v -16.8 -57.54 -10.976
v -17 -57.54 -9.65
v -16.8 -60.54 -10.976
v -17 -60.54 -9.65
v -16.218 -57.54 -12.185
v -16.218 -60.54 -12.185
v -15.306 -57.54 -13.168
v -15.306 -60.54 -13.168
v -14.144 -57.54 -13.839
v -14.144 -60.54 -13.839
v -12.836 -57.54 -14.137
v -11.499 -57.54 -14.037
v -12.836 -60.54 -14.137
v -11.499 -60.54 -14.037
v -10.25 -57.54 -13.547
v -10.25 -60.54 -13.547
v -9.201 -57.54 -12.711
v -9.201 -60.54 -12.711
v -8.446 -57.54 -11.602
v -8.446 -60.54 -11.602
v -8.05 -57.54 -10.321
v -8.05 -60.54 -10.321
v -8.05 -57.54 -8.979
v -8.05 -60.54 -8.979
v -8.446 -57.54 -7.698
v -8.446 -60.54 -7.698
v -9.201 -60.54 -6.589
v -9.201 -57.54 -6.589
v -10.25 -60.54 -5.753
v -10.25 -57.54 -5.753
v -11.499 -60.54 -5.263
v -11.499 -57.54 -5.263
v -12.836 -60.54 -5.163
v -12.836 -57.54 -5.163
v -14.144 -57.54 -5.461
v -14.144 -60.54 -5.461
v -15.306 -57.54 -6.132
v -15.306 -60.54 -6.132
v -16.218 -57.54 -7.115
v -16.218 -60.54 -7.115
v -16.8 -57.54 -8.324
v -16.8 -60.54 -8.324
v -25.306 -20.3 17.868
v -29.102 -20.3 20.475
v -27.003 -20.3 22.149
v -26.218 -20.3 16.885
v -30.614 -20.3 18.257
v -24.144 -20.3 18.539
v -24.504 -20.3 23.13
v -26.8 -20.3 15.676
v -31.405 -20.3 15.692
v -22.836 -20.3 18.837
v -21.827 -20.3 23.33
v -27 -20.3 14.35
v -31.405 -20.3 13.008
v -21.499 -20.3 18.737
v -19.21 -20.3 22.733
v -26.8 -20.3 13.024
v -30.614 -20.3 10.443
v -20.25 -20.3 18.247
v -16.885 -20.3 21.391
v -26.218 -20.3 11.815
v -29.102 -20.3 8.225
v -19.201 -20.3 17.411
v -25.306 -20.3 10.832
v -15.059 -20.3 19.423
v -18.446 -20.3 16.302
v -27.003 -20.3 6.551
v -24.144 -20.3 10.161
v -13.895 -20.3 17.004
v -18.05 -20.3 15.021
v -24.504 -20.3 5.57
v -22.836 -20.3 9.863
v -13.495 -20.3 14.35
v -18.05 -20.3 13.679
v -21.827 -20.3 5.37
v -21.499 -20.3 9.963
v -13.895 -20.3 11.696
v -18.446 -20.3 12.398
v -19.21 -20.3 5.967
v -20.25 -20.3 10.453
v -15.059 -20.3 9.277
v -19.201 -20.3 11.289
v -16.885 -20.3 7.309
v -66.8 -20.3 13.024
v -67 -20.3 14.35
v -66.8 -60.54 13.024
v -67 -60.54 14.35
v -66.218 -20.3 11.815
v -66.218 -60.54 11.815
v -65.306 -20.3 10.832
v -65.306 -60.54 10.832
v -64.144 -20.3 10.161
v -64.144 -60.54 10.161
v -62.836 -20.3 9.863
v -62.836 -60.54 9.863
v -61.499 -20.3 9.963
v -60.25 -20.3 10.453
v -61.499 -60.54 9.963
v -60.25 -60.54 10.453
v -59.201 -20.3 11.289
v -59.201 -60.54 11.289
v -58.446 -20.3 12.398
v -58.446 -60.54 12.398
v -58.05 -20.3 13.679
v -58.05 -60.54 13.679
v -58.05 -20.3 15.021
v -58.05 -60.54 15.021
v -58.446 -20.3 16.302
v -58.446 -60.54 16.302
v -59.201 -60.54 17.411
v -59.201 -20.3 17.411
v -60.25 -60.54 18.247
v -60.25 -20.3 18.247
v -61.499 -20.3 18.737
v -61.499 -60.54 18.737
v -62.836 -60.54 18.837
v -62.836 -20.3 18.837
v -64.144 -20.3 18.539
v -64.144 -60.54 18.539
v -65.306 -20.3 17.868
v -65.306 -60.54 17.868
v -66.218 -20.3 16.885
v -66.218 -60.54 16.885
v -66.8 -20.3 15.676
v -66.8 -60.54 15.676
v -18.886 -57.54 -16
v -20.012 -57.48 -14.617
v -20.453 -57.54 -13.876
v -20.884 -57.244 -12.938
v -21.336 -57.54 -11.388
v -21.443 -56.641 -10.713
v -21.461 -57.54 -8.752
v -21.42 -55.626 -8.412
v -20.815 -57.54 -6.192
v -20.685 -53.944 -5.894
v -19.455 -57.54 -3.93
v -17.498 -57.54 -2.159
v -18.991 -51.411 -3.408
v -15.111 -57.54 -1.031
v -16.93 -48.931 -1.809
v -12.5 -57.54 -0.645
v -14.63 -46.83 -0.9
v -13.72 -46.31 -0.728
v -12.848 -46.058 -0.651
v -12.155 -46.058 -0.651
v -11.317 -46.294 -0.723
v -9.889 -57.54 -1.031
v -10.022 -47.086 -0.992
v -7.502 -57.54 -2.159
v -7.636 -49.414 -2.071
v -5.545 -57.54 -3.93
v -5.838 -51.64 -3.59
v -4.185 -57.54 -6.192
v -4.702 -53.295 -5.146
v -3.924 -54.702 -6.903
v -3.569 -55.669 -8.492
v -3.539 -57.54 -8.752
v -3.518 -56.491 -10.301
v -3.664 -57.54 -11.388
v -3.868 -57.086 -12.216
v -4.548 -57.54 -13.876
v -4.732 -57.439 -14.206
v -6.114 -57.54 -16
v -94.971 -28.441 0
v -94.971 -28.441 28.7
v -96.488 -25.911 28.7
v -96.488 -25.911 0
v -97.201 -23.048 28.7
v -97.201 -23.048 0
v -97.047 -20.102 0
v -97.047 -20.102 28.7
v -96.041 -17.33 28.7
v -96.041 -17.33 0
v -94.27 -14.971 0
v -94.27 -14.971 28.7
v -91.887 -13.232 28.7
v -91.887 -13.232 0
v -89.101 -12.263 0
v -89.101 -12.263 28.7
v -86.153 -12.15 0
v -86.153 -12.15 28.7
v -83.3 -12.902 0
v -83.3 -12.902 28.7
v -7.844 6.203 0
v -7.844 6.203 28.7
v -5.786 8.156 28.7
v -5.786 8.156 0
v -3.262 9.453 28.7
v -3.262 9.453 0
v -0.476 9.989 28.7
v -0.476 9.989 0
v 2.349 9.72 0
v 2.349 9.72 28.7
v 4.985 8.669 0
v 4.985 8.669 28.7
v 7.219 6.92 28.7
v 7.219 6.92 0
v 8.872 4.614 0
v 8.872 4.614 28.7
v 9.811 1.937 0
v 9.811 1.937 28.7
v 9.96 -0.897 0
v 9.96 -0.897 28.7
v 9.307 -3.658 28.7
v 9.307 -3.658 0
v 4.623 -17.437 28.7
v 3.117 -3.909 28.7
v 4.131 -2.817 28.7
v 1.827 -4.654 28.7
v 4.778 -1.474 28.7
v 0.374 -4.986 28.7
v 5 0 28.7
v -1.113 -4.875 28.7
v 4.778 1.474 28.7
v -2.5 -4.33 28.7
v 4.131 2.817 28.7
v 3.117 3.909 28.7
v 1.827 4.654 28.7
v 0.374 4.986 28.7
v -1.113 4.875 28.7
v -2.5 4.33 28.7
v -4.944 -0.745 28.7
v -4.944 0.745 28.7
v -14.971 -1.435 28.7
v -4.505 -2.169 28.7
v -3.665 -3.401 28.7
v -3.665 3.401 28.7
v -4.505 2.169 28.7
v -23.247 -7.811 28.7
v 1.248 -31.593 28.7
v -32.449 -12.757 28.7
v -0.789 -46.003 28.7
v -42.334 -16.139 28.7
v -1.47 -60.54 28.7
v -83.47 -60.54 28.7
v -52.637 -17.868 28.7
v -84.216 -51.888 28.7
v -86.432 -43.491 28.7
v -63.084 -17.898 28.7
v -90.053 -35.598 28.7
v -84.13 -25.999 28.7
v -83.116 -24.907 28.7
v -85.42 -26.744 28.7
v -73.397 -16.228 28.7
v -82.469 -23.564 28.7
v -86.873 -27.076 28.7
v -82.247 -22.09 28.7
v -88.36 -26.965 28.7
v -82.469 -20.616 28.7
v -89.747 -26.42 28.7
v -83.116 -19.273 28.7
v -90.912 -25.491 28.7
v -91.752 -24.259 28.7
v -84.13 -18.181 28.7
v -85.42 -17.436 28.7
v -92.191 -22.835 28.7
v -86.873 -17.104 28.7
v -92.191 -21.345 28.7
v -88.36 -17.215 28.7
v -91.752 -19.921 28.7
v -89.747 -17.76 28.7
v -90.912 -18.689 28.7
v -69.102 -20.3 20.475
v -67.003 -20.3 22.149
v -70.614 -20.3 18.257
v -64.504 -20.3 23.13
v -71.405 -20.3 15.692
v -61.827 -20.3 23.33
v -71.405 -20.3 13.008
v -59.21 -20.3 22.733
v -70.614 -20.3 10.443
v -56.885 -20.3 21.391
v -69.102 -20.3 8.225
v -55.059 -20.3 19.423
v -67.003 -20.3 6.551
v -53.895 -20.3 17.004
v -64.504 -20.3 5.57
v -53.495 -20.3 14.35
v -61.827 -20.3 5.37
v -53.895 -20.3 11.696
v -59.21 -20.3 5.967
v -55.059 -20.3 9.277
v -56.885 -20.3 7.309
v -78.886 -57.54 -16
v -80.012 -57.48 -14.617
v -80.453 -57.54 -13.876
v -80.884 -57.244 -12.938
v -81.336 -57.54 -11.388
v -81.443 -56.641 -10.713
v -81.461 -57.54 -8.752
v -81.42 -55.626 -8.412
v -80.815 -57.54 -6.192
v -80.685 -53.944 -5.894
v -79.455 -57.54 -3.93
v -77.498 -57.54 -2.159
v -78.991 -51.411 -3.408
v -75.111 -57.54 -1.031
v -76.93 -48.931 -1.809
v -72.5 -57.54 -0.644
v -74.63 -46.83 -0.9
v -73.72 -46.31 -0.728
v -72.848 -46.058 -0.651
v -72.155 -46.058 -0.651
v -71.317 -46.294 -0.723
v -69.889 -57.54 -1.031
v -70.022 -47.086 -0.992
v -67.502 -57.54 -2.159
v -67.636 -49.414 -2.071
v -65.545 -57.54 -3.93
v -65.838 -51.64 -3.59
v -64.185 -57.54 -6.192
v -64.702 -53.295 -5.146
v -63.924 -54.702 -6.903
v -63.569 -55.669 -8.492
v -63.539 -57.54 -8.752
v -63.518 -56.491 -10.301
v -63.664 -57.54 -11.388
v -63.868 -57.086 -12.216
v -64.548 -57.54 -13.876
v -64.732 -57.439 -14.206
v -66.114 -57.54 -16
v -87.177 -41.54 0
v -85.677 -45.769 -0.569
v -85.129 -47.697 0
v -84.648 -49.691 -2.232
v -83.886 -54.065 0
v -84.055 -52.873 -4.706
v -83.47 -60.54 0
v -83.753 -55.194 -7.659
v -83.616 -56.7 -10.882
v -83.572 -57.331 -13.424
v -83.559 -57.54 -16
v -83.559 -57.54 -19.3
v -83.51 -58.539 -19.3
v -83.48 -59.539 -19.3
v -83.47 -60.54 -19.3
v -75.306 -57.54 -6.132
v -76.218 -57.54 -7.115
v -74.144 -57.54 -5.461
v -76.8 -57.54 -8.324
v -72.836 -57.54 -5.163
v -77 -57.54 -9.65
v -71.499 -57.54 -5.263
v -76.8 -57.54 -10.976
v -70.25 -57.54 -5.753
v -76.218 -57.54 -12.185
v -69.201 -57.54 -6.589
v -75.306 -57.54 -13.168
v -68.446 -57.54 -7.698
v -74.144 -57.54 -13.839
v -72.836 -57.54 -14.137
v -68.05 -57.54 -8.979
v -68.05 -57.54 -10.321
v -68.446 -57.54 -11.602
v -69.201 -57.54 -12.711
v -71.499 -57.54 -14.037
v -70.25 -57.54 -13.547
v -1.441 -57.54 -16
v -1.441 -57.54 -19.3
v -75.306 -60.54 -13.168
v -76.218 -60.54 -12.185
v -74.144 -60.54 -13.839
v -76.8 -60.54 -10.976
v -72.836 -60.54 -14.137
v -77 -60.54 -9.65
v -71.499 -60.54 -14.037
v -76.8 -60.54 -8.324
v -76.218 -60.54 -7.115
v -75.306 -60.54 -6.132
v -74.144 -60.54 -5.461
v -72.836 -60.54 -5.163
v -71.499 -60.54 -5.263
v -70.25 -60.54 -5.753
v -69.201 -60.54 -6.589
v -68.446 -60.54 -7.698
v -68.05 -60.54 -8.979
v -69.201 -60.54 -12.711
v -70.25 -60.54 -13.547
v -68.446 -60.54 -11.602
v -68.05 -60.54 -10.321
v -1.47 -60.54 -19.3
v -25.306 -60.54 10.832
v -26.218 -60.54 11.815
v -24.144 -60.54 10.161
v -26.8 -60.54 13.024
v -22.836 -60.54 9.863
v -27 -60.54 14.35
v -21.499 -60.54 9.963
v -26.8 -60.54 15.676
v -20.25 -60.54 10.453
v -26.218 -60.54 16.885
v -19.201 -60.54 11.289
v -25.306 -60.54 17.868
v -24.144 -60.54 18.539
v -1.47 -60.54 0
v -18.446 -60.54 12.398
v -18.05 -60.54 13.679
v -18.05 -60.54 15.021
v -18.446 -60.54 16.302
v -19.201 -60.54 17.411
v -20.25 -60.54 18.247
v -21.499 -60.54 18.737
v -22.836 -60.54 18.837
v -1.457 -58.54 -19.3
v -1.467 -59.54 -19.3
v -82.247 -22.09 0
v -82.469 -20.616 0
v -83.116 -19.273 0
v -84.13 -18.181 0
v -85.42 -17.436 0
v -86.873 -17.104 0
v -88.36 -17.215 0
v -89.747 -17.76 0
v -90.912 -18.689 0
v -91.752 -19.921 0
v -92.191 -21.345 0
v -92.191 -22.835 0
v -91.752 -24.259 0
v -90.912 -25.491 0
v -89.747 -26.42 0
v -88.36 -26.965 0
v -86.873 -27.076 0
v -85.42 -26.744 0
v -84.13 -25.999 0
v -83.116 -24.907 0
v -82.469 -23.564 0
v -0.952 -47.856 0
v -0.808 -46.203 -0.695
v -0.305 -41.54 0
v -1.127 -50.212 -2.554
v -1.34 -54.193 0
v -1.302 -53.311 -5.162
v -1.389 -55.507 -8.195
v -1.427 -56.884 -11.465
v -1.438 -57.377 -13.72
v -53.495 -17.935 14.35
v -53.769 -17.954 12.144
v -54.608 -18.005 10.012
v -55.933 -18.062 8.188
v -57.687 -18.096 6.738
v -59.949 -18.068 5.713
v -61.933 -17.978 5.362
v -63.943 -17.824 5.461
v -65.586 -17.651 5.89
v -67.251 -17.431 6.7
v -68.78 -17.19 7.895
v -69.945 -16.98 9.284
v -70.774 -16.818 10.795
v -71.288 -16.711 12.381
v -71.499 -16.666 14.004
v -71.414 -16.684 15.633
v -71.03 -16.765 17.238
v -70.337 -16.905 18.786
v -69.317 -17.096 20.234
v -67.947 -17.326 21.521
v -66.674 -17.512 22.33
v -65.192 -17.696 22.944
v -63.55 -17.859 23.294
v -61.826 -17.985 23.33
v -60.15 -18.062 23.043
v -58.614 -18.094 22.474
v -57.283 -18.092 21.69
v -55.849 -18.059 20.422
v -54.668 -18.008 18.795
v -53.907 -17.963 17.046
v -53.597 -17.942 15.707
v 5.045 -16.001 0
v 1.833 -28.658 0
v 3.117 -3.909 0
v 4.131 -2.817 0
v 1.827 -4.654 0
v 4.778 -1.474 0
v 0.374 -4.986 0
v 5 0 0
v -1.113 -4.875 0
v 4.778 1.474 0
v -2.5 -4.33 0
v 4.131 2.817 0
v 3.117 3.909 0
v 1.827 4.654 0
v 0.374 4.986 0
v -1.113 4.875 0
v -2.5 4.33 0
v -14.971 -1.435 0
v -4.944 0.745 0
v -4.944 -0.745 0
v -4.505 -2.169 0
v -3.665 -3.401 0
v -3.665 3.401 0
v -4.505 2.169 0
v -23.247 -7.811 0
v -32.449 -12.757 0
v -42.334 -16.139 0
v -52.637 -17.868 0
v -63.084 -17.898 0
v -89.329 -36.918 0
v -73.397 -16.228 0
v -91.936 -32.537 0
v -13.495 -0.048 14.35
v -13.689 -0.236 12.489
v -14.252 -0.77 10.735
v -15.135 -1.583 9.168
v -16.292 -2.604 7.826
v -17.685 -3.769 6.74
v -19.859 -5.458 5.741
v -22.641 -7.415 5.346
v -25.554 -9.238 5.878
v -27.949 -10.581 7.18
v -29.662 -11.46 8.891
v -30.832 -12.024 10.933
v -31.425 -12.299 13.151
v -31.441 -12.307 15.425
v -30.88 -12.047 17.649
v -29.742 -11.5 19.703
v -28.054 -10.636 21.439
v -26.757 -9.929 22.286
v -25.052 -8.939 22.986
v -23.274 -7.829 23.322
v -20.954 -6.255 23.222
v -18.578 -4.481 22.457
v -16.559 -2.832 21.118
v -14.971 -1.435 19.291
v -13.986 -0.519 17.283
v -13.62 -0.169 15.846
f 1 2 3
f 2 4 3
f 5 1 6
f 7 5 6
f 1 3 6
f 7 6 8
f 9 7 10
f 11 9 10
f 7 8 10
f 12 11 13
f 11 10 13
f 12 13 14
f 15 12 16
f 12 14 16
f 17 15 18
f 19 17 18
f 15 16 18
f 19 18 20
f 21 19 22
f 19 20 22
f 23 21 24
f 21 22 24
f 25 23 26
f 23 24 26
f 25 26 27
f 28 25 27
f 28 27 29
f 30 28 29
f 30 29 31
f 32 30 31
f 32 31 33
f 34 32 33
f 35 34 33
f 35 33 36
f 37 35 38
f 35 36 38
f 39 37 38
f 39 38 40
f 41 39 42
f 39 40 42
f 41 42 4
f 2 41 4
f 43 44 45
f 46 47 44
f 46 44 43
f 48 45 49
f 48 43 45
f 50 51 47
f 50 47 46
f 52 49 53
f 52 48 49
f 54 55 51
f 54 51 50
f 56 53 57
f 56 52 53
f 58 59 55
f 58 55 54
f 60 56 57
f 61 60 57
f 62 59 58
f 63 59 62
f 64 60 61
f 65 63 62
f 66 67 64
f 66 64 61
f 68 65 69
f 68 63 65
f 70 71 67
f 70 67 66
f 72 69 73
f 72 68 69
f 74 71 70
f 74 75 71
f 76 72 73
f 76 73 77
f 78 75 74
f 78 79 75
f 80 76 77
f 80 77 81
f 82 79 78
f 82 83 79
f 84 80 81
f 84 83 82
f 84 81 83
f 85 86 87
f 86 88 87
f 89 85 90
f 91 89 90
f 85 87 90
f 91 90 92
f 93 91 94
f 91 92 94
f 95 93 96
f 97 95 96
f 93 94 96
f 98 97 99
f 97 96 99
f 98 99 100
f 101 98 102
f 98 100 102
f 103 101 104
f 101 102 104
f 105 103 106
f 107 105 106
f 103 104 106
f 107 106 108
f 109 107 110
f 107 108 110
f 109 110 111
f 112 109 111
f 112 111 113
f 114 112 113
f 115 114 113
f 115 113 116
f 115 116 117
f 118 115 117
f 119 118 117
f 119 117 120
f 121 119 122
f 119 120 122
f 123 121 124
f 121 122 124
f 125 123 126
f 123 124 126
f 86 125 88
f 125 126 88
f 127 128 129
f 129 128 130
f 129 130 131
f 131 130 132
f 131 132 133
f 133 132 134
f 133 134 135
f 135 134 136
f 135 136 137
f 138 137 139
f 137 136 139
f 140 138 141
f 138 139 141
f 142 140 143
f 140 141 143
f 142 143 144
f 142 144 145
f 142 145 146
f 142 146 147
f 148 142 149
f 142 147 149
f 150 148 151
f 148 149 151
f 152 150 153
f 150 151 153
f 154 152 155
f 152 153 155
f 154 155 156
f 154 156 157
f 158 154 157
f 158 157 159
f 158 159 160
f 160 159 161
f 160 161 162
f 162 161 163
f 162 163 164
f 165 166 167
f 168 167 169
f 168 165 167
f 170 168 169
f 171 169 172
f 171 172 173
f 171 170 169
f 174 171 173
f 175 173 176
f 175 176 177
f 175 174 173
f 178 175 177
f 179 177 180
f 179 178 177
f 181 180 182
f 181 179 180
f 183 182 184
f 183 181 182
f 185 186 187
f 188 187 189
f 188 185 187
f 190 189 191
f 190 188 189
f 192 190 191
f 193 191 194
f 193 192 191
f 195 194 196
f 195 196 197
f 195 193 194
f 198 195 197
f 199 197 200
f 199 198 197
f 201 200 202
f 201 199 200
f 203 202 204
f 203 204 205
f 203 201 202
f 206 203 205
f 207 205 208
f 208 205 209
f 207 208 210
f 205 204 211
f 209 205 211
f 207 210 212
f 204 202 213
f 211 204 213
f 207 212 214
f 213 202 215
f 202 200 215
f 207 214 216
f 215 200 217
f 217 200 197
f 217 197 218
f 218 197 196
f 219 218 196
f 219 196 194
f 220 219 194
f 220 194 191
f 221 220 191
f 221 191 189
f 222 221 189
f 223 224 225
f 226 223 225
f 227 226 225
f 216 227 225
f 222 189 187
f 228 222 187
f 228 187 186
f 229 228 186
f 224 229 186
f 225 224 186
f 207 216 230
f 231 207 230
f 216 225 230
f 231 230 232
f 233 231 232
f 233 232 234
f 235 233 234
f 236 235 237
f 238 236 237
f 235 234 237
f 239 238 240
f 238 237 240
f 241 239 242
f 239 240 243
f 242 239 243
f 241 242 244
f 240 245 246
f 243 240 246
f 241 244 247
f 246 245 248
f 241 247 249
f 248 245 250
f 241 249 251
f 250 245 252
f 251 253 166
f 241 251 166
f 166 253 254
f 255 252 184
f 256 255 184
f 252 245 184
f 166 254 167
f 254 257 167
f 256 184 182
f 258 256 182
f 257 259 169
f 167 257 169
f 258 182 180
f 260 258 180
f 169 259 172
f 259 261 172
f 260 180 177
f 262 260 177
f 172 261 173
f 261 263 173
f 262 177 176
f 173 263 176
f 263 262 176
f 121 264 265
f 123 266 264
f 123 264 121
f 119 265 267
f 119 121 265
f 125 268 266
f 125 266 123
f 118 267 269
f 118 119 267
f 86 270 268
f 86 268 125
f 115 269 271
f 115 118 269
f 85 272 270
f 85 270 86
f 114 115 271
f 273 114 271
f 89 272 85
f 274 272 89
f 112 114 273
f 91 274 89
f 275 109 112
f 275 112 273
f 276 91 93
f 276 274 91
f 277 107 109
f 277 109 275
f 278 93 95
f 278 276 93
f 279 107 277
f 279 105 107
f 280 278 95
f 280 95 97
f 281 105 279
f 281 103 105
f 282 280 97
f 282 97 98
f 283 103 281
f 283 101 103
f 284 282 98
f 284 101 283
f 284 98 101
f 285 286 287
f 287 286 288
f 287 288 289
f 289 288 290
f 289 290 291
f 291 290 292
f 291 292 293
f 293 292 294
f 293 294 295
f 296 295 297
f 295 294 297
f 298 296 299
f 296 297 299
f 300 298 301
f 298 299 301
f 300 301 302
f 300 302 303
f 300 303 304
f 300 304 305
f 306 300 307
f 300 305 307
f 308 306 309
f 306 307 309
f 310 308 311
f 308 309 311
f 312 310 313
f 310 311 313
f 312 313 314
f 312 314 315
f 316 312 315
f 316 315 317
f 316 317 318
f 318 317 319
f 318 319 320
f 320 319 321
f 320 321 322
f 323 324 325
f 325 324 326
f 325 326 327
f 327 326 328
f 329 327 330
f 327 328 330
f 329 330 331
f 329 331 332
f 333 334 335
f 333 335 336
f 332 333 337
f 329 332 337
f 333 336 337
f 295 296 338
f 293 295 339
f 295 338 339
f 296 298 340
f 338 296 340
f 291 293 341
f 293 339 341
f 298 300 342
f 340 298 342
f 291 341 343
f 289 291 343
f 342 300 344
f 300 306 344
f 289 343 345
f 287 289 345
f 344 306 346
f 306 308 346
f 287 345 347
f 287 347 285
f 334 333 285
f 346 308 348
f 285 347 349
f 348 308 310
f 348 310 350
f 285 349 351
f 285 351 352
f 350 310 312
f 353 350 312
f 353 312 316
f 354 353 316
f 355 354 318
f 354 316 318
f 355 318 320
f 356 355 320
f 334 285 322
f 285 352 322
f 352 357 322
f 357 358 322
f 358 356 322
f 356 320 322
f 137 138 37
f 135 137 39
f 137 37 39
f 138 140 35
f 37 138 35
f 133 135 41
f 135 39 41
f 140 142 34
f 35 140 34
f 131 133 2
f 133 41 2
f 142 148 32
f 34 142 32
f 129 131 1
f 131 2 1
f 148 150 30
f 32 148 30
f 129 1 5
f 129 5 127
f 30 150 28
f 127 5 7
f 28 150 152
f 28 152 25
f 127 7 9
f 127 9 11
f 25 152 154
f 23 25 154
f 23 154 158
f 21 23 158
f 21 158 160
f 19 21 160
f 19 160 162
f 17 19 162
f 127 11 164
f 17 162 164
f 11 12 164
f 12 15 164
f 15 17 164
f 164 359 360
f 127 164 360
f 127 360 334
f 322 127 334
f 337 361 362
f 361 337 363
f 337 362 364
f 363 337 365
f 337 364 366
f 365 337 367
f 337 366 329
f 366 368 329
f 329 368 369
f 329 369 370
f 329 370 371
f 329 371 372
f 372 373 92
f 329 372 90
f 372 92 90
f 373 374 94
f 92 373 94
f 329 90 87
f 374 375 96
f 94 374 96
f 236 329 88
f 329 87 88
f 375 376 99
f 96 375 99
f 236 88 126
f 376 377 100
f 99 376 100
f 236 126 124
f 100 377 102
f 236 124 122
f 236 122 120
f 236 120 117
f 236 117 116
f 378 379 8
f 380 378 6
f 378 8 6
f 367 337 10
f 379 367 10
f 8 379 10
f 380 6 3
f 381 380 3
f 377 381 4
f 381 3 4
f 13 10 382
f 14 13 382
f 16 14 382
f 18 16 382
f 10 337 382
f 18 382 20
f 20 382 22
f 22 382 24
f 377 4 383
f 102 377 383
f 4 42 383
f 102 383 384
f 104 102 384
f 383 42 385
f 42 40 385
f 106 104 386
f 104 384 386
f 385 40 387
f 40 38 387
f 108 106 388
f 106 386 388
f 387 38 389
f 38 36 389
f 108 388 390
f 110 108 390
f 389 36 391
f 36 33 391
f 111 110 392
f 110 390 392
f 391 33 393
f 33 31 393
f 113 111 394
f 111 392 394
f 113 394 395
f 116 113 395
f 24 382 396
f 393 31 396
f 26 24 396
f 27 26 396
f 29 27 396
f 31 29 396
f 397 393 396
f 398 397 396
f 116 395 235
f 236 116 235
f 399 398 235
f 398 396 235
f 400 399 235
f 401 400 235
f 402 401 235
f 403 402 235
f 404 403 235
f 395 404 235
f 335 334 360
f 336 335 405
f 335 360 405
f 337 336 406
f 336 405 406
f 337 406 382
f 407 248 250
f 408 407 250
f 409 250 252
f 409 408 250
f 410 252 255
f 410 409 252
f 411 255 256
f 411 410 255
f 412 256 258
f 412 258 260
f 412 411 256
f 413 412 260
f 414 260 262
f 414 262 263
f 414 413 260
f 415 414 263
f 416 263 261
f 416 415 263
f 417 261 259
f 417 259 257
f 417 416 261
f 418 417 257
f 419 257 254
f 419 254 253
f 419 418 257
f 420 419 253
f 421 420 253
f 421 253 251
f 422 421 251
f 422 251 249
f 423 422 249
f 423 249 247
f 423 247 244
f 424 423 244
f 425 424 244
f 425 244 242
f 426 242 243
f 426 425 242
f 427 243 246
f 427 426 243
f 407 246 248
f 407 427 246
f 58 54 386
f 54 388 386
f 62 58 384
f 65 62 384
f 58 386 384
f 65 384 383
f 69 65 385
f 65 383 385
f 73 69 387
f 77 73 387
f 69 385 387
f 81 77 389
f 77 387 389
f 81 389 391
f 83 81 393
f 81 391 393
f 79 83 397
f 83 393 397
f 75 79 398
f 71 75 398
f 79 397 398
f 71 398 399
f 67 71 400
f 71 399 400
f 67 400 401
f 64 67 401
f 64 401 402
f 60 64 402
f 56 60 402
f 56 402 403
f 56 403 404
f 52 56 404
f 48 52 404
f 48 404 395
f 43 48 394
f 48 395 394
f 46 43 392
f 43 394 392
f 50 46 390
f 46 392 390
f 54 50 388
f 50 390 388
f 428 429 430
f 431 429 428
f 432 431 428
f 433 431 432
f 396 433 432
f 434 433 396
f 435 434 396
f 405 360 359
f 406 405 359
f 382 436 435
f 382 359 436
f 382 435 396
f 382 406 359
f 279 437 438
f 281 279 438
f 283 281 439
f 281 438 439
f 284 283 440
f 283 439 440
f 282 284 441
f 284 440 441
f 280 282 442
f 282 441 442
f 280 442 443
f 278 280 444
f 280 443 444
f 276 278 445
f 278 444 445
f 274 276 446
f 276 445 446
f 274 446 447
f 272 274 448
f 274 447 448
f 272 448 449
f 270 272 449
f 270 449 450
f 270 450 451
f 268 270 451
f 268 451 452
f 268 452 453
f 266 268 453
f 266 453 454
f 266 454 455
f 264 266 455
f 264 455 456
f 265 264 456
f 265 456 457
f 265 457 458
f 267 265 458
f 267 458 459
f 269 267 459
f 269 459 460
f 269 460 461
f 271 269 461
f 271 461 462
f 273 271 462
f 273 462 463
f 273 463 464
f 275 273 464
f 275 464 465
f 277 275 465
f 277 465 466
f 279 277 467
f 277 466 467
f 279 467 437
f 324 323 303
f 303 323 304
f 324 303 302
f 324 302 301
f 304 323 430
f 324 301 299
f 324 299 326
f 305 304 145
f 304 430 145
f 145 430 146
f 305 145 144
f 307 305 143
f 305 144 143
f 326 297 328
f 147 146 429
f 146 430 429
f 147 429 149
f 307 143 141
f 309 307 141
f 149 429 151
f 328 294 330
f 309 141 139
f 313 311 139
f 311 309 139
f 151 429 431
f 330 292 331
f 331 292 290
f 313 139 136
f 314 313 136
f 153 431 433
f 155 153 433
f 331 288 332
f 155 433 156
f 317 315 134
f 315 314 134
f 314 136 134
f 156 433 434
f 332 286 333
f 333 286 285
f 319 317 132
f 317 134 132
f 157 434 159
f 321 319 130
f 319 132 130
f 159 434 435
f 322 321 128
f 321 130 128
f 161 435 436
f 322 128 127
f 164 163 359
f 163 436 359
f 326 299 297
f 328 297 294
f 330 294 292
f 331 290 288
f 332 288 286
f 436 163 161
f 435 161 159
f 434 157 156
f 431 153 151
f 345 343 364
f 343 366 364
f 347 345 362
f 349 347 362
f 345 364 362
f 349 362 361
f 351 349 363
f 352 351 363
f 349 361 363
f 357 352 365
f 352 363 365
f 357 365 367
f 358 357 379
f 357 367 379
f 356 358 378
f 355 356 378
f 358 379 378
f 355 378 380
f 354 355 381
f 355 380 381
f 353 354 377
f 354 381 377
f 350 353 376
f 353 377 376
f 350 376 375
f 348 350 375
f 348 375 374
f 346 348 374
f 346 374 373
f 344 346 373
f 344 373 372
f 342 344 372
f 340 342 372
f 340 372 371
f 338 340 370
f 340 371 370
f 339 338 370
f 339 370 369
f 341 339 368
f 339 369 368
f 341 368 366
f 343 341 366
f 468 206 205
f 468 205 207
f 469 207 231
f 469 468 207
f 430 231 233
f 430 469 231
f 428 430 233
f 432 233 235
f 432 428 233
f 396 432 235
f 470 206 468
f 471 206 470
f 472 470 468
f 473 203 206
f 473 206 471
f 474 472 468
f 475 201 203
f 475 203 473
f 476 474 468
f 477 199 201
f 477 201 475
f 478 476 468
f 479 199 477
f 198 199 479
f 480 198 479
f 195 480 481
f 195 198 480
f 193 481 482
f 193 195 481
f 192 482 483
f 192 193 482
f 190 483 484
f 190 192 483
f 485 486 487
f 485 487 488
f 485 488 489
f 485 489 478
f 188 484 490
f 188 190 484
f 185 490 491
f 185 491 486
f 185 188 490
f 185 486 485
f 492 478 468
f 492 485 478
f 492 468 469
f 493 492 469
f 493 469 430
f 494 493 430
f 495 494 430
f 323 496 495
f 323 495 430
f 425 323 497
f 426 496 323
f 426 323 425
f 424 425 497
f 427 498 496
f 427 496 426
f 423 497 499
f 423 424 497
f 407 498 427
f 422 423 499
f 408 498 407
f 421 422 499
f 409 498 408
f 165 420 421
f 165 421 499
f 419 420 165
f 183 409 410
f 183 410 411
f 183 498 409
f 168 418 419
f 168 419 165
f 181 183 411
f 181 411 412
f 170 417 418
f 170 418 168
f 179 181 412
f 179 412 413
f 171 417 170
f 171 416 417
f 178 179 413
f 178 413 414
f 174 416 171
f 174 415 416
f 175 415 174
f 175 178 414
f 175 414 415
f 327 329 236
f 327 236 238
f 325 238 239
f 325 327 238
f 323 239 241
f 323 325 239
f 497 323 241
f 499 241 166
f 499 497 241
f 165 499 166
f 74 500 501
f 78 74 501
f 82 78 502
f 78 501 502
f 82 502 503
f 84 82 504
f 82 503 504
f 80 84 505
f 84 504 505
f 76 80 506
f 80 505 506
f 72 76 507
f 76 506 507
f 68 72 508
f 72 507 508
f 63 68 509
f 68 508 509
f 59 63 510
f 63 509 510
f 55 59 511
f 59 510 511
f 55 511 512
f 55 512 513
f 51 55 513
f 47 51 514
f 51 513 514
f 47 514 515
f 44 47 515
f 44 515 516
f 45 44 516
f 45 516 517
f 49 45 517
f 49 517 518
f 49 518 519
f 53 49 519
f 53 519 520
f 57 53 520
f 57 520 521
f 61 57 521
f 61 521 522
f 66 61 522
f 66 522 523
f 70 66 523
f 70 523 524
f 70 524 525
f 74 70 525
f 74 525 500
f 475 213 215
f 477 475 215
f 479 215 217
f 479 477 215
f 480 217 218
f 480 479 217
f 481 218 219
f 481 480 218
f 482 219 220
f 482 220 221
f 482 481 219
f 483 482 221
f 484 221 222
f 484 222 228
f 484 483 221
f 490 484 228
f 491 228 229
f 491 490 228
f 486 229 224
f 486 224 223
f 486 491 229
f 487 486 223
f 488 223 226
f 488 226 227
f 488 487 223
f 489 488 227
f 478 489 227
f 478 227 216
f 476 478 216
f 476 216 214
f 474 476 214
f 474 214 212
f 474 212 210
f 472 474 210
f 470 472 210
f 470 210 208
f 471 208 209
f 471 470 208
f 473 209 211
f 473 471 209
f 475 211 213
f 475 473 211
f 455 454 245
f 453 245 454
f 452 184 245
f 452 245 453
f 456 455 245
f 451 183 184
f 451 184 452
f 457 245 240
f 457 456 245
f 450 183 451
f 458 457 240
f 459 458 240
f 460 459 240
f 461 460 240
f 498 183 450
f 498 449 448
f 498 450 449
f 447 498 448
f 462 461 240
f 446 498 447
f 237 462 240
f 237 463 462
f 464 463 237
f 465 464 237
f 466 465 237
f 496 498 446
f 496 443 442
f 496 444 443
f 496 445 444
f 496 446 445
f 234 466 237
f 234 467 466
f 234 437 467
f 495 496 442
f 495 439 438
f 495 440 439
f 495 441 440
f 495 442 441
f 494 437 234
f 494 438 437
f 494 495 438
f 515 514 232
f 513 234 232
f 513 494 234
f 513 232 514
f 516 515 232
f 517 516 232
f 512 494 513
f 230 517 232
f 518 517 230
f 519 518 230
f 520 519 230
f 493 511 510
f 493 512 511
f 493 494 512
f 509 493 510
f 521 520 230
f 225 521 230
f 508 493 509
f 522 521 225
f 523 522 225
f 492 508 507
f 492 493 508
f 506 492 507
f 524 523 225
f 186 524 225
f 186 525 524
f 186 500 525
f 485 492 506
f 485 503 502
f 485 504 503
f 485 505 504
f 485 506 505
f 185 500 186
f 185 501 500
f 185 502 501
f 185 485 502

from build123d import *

# Parameters (mm, degrees)
SZKIC1_R                                            = 5
DODANIE_WYCI_GNI_CIE1_DEPTH                         = 28.7
DODANIE_WYCI_GNI_CIE2_REACH                         = 120.092
DODANIE_WYCI_GNI_CIE2_END_RADIUS                    = 50.543324632
WYTNIJ_WYCI_GNI_CIE1_START                          = -19.3
WYTNIJ_WYCI_GNI_CIE1_DEPTH                          = 19.3
POG_BIENIE_WALCOWE_POD_M8_WKR_T_Z_BEM_S_D           = 9
POG_BIENIE_WALCOWE_POD_M8_WKR_T_Z_BEM_S_CBORE_D     = 18.011
POG_BIENIE_WALCOWE_POD_M8_WKR_T_Z_BEM_S_CBORE_DEPTH = 20.3
POG_BIENIE_WALCOWE_POD_M8_WKR_T_Z_B_2_D             = 9
POG_BIENIE_WALCOWE_POD_M8_WKR_T_Z_B_2_CBORE_D       = 18.011
POG_BIENIE_WALCOWE_POD_M8_WKR_T_Z_B_2_CBORE_DEPTH   = 57.54


with BuildPart() as part:
    # Szkic1 → Dodanie-wyciągnięcie1 (new body)
    with BuildSketch(Plane.XY):
        with BuildLine():
            Line((-1.469986393, -60.54), (-83.469986393, -60.54))
            ThreePointArc((-83.469986393, -60.54), (-86.43214098, -43.49124867), (-94.971403209, -28.440824015))
            ThreePointArc((-94.971403209, -28.440824015), (-95.242829308, -16.084497343), (-83.300365534, -12.901724973))
            ThreePointArc((-83.300365534, -12.901724973), (-42.333721248, -16.139046942), (-7.843535904, 6.203139892))
            ThreePointArc((-7.843535904, 6.203139892), (4.984530504, 8.669166953), (9.306965288, -3.657922516))
            ThreePointArc((9.306965288, -3.657922516), (1.248004894, -31.593007814), (-1.469986393, -60.54))
        make_face()
        with Locations((-87.246959259, -22.09)):
            Circle(SZKIC1_R, mode=Mode.SUBTRACT)
        Circle(SZKIC1_R, mode=Mode.SUBTRACT)
    extrude(amount=DODANIE_WYCI_GNI_CIE1_DEPTH)

    # Dodanie-wyciągnięcie2: up to this cylinder (the profile starts outside it)
    dodanie_wyci_gni_cie2_end = Plane(origin=(-134.013311026, -60.54, -6.691691), z_dir=(0, 0, -1)) * Cylinder(DODANIE_WYCI_GNI_CIE2_END_RADIUS, 342.270649265, mode=Mode.PRIVATE)
    # Szkic3 → Dodanie-wyciągnięcie2 (add, up to the surface)
    with BuildSketch(Plane(origin=(0, 0, 0), x_dir=(0, 0, -1), z_dir=(1, 0, 0)), mode=Mode.PRIVATE) as dodanie_wyci_gni_cie2_sk1:
        with BuildLine():
            Line((0, -60.54), (0, -41.54))
            ThreePointArc((0, -41.54), (4.686291501, -52.853708499), (16, -57.54))
            Line((16, -57.54), (19.3, -57.54))
            Line((19.3, -57.54), (19.3, -60.54))
            Line((19.3, -60.54), (0, -60.54))
        make_face()
    dodanie_wyci_gni_cie2_tool1 = extrude(dodanie_wyci_gni_cie2_sk1.sketch, amount=-DODANIE_WYCI_GNI_CIE2_REACH, mode=Mode.PRIVATE) - dodanie_wyci_gni_cie2_end
    add(dodanie_wyci_gni_cie2_tool1.solids().sort_by_distance((0, -56.56965, -6.691691))[0])

    # Szkic4 → Wytnij-wyciągnięcie1 (cut)
    with BuildSketch(Plane.XY.offset(WYTNIJ_WYCI_GNI_CIE1_START)):
        with BuildLine():
            Line((-1.469986393, -60.54), (0, -60.54))
            Line((0, -60.54), (0, -41.54))
            Line((0, -41.54), (-0.304878126, -41.54))
            ThreePointArc((-0.304878126, -41.54), (-1.178436016, -51.022155217), (-1.469986393, -60.54))
        make_face()
    extrude(amount=WYTNIJ_WYCI_GNI_CIE1_DEPTH, mode=Mode.SUBTRACT)

    # Pog_bienie walcowe pod M8 Wkr_t z _bem s (through all)
    with Locations(Plane(origin=(0, 0, 0), x_dir=(1, 0, 0), z_dir=(0, 1, 0))):
        with Locations((-62.500071487, -14.35), (-22.500071487, -14.35)):
            CounterBoreHole(POG_BIENIE_WALCOWE_POD_M8_WKR_T_Z_BEM_S_D / 2, POG_BIENIE_WALCOWE_POD_M8_WKR_T_Z_BEM_S_CBORE_D / 2, POG_BIENIE_WALCOWE_POD_M8_WKR_T_Z_BEM_S_CBORE_DEPTH)

    # Pog_bienie walcowe pod M8 Wkr_t z _b 2 (through all)
    with Locations(Plane(origin=(0, 0, 0), x_dir=(1, 0, 0), z_dir=(0, 1, 0))):
        with Locations((-72.500071487, 9.65), (-12.500071487, 9.65)):
            CounterBoreHole(POG_BIENIE_WALCOWE_POD_M8_WKR_T_Z_B_2_D / 2, POG_BIENIE_WALCOWE_POD_M8_WKR_T_Z_B_2_CBORE_D / 2, POG_BIENIE_WALCOWE_POD_M8_WKR_T_Z_B_2_CBORE_DEPTH)


solid = part.part
